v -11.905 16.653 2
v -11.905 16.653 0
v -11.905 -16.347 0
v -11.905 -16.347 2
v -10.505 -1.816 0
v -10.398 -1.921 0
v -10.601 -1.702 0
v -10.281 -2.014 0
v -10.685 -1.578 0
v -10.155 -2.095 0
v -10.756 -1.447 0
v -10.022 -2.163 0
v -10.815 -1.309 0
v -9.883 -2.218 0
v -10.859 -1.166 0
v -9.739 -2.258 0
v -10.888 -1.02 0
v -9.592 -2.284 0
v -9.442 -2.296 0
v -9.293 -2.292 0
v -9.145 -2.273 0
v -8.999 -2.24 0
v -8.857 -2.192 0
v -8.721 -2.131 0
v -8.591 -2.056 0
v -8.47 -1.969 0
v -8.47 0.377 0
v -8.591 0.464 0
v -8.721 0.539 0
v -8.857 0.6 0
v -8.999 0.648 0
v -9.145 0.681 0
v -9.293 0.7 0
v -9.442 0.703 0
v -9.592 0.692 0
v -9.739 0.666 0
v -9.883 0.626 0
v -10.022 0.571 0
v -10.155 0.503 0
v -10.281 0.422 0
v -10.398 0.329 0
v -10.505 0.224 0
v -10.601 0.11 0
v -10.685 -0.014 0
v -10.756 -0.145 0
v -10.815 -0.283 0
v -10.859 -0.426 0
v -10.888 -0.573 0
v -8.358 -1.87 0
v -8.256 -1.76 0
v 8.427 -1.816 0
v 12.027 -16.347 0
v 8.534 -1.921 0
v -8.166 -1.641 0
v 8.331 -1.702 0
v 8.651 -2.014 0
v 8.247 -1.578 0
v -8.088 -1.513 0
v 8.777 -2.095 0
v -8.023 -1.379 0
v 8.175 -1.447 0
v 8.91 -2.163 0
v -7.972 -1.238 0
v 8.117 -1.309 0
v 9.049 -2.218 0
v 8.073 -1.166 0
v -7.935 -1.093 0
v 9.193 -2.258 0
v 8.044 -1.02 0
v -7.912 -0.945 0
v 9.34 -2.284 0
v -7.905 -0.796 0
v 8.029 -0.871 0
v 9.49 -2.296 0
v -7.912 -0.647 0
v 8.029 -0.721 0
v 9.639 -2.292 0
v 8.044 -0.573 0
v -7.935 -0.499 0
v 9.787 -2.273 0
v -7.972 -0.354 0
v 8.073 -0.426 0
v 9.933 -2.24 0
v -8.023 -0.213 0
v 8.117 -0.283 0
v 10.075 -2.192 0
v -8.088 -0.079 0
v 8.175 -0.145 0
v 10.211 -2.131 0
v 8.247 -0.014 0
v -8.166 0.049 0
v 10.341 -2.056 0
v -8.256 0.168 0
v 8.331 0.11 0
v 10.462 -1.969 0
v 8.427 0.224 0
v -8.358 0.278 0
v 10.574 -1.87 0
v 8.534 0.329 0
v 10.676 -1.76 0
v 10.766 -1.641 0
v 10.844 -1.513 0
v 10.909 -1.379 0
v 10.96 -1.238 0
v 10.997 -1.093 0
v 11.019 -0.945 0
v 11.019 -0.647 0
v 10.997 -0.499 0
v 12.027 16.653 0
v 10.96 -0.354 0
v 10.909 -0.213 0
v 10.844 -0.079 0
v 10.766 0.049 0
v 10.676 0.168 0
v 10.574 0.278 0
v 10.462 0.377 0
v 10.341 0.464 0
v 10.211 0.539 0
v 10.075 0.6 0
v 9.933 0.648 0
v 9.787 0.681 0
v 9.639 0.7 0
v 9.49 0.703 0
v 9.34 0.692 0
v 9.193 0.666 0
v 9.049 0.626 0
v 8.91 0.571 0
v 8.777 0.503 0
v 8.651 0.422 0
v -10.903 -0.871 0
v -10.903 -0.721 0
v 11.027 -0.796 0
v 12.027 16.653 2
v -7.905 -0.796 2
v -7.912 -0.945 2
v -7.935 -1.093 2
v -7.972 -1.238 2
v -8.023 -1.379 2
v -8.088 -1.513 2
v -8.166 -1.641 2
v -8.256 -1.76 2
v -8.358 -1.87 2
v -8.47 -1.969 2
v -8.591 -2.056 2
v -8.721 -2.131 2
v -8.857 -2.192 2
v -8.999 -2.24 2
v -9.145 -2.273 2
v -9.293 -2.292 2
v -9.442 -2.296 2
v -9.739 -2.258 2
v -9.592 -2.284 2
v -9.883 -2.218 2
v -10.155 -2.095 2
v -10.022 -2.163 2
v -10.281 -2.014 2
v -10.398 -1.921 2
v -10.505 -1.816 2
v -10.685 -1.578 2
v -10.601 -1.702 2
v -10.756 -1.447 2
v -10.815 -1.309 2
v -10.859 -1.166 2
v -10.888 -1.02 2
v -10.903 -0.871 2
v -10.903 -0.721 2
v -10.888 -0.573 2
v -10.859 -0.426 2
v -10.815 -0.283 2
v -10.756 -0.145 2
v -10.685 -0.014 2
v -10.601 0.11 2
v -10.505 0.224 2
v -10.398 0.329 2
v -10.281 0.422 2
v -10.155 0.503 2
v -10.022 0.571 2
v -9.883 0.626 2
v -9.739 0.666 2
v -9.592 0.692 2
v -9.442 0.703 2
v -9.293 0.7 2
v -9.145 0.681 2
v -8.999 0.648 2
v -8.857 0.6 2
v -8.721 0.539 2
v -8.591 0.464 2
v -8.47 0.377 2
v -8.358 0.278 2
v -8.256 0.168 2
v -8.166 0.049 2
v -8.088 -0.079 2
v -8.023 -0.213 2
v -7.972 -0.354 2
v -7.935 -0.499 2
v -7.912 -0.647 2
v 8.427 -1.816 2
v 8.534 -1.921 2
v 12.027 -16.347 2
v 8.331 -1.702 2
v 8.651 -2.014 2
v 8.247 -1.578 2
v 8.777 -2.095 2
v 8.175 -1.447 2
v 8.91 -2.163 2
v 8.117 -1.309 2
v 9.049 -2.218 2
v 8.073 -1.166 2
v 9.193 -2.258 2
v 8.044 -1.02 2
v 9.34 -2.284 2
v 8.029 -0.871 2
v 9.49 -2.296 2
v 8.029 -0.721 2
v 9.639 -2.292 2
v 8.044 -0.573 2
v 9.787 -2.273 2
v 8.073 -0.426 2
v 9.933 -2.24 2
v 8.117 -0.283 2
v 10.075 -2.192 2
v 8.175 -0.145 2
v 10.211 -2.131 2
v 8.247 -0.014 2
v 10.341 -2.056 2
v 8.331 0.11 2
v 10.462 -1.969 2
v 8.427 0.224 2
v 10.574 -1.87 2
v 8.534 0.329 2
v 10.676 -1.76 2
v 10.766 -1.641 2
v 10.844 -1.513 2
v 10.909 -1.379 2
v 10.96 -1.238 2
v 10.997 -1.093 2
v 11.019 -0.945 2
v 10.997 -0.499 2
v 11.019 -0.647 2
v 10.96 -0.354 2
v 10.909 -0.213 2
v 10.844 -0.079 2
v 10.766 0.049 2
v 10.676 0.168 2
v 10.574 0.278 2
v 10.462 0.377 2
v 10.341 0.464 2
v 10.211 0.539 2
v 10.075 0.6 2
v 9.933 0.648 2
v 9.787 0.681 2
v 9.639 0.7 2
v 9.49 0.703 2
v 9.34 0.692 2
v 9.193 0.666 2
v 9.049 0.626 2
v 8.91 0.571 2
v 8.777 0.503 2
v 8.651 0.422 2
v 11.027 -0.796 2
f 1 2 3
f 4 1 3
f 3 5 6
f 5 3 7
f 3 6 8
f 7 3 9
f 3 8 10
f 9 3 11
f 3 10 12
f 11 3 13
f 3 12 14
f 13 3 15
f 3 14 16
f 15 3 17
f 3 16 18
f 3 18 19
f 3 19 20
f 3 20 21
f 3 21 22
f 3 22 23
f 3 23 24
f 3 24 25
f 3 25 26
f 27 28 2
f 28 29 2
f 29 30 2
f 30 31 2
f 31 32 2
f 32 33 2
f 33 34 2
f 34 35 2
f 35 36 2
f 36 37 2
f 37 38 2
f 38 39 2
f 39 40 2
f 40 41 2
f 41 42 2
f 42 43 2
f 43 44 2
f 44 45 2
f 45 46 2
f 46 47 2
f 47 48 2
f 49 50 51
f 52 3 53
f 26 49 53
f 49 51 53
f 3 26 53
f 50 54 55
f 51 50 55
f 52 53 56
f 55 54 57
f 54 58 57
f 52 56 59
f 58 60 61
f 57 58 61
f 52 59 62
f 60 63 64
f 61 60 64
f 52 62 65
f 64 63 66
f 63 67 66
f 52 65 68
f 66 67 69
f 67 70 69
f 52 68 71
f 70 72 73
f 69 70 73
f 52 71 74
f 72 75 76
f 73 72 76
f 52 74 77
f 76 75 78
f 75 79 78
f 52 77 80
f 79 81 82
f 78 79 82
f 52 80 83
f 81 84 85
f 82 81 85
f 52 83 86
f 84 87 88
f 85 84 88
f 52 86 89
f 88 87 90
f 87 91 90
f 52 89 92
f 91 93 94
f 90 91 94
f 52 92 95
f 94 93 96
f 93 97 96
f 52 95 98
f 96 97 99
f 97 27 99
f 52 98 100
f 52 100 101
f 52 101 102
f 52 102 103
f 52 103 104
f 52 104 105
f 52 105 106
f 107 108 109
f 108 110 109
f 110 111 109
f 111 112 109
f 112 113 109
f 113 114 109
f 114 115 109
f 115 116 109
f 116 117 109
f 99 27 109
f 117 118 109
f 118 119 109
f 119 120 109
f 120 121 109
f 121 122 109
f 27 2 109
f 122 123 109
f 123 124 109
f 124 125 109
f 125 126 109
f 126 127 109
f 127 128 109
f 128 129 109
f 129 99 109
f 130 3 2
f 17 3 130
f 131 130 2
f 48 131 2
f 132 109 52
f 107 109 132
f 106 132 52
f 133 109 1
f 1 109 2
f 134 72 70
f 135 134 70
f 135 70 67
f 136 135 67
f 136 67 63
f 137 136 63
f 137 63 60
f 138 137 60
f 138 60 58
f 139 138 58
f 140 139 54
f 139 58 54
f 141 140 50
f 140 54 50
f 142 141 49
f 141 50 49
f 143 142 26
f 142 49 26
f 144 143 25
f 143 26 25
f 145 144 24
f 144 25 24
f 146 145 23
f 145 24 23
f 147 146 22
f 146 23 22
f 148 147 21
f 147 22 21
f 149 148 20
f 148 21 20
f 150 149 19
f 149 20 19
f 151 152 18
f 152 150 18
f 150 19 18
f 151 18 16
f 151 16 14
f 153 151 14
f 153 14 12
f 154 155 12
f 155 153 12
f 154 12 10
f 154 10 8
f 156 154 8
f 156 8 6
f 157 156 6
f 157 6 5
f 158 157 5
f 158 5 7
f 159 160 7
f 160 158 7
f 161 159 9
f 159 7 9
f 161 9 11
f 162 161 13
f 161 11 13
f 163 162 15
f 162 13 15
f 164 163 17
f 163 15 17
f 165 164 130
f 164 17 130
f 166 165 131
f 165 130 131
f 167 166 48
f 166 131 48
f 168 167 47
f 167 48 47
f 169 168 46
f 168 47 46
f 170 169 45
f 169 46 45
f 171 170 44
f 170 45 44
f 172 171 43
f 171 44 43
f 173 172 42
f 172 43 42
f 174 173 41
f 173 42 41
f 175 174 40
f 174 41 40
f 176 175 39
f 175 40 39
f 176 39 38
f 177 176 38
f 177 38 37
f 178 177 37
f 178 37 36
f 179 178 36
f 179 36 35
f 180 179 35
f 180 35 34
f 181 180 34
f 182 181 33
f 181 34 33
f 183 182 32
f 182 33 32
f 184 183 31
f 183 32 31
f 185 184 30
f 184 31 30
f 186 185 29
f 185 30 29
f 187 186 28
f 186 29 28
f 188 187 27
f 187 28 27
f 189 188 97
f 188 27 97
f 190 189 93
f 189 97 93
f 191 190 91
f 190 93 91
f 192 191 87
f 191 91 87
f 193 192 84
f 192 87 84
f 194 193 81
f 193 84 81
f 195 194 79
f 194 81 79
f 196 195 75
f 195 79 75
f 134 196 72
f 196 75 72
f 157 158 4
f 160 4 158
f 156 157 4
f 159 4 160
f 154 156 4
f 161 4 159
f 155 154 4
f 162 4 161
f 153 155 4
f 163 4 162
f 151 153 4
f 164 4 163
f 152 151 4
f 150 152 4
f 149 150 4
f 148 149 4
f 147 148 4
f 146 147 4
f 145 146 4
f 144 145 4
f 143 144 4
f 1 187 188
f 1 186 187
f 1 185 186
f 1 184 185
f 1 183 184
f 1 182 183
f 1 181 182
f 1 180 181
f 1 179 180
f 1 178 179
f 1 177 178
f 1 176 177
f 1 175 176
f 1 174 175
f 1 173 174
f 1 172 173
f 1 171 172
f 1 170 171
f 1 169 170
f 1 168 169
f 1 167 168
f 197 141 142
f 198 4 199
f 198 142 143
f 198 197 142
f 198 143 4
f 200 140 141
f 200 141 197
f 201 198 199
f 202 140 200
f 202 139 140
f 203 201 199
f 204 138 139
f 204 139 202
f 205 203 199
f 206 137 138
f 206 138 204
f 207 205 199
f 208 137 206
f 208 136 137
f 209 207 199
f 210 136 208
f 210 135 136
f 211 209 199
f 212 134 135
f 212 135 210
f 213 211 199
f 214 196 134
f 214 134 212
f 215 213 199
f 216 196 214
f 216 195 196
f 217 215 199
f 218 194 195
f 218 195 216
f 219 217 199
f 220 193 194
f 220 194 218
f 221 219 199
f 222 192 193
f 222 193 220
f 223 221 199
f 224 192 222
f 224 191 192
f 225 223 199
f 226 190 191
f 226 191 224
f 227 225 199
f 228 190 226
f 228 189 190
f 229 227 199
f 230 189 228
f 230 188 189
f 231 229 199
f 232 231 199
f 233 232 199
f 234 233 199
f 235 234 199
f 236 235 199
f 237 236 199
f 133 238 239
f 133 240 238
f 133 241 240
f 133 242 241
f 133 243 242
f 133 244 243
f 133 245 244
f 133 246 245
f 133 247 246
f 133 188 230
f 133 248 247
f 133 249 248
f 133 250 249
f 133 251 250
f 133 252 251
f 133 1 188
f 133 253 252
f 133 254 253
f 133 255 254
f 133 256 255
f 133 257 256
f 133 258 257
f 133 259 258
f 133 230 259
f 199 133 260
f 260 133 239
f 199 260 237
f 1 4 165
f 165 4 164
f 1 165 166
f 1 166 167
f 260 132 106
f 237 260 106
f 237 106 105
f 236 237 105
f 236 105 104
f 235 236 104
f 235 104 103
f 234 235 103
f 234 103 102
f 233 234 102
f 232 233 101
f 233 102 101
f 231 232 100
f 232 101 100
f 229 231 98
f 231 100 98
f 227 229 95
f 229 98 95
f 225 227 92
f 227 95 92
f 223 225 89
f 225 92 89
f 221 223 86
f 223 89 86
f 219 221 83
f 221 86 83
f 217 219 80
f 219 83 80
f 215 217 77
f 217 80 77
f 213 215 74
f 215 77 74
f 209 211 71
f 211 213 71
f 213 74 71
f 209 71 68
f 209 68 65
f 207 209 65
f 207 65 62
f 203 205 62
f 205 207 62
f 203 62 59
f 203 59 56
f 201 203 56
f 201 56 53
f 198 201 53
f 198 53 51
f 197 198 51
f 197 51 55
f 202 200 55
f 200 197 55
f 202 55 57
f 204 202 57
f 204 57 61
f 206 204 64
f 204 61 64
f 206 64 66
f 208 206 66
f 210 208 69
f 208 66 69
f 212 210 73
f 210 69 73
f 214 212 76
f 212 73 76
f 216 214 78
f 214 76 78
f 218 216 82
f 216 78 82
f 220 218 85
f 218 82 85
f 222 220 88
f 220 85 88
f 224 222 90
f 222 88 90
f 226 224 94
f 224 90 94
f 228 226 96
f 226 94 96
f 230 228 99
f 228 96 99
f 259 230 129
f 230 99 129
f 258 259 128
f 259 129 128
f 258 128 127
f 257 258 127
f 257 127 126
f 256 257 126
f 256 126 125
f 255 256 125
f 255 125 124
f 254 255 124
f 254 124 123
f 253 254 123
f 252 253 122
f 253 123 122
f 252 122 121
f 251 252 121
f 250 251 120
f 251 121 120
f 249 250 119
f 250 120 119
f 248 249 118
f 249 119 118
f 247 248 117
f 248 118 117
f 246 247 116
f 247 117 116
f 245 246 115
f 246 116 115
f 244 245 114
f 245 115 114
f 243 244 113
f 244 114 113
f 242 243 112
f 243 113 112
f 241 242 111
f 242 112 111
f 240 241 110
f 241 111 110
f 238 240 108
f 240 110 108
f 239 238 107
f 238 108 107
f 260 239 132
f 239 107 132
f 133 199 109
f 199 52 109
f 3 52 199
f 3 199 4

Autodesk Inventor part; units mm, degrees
ref_plane "YZ Plane" through (0, 0, 0) normal (1, 0, 0) x (0, 1, 0)
ref_plane "XZ Plane" through (0, 0, 0) normal (0, 1, 0) x (-1, 0, 0)
ref_plane "XY Plane" through (0, 0, 0) normal (0, 0, 1) x (1, 0, 0)
sketch "草图1" plane through (0, 0, 0) normal (0, 0, 1) x (1, 0, 0)
  circle A0 centre (-9.405, -0.7961) radius 2 projected
  line L0 (-4.9391, -16.3471) -> (-4.9391, -13.3471) projected
  line L1 (-4.9391, -13.3471) -> (-6.4391, -13.3471) projected
  line L2 (-6.4391, -13.3471) -> (-6.4391, 13.6529) projected
  line L3 (-4.9391, 13.6529) -> (-6.4391, 13.6529) projected
  line L4 (-4.9391, 16.6529) -> (-4.9391, 13.6529) projected
  line L5 (-4.9391, 16.6529) -> (-11.9051, 16.6529) projected
  line L6 (-11.9051, 16.6529) -> (-11.9051, -16.3471) projected
  line L7 (-4.9391, -16.3471) -> (-11.9051, -16.3471) projected
  circle A1 centre (9.5269, -0.7961) radius 2 projected
  line L8 (5.0609, -16.3471) -> (12.0269, -16.3471) projected
  line L9 (12.0269, -16.3471) -> (12.0269, 16.6529) projected
  line L10 (5.0609, 16.6529) -> (12.0269, 16.6529) projected
  line L11 (5.0609, 16.6529) -> (5.0609, 13.6529) projected
  line L12 (6.5609, 13.6529) -> (5.0609, 13.6529) projected
  line L13 (6.5609, -13.3471) -> (6.5609, 13.6529) projected
  line L14 (6.5609, -13.3471) -> (5.0609, -13.3471) projected
  line L15 (5.0609, -13.3471) -> (5.0609, -16.3471) projected
  line L16 (12.0269, -16.3471) -> (-11.9051, -16.3471)
  line L17 (-11.9051, -16.3471) -> (-11.9051, 16.6529)
  line L18 (-11.9051, 16.6529) -> (12.0269, 16.6529)
  line L19 (12.0269, 16.6529) -> (12.0269, -16.3471)
  circle A2 centre (9.5269, -0.7961) radius 1.5
  circle A3 centre (-9.405, -0.7961) radius 1.5
  dimension "d2" = 0.5
  dimension "d3" = 0.5
extrude "拉伸1" add sketch "草图1" along normal blind 2 contours A0 | L7 L6 L5 L4 L3 L2 L1 L0 | L0 L1 L2 L3 L4 L18 L11 L12 L13 L14 L15 L16 | L15 L14 L13 L12 L11 L10 L9 L8 | A1
properties part number "触点外壳"
